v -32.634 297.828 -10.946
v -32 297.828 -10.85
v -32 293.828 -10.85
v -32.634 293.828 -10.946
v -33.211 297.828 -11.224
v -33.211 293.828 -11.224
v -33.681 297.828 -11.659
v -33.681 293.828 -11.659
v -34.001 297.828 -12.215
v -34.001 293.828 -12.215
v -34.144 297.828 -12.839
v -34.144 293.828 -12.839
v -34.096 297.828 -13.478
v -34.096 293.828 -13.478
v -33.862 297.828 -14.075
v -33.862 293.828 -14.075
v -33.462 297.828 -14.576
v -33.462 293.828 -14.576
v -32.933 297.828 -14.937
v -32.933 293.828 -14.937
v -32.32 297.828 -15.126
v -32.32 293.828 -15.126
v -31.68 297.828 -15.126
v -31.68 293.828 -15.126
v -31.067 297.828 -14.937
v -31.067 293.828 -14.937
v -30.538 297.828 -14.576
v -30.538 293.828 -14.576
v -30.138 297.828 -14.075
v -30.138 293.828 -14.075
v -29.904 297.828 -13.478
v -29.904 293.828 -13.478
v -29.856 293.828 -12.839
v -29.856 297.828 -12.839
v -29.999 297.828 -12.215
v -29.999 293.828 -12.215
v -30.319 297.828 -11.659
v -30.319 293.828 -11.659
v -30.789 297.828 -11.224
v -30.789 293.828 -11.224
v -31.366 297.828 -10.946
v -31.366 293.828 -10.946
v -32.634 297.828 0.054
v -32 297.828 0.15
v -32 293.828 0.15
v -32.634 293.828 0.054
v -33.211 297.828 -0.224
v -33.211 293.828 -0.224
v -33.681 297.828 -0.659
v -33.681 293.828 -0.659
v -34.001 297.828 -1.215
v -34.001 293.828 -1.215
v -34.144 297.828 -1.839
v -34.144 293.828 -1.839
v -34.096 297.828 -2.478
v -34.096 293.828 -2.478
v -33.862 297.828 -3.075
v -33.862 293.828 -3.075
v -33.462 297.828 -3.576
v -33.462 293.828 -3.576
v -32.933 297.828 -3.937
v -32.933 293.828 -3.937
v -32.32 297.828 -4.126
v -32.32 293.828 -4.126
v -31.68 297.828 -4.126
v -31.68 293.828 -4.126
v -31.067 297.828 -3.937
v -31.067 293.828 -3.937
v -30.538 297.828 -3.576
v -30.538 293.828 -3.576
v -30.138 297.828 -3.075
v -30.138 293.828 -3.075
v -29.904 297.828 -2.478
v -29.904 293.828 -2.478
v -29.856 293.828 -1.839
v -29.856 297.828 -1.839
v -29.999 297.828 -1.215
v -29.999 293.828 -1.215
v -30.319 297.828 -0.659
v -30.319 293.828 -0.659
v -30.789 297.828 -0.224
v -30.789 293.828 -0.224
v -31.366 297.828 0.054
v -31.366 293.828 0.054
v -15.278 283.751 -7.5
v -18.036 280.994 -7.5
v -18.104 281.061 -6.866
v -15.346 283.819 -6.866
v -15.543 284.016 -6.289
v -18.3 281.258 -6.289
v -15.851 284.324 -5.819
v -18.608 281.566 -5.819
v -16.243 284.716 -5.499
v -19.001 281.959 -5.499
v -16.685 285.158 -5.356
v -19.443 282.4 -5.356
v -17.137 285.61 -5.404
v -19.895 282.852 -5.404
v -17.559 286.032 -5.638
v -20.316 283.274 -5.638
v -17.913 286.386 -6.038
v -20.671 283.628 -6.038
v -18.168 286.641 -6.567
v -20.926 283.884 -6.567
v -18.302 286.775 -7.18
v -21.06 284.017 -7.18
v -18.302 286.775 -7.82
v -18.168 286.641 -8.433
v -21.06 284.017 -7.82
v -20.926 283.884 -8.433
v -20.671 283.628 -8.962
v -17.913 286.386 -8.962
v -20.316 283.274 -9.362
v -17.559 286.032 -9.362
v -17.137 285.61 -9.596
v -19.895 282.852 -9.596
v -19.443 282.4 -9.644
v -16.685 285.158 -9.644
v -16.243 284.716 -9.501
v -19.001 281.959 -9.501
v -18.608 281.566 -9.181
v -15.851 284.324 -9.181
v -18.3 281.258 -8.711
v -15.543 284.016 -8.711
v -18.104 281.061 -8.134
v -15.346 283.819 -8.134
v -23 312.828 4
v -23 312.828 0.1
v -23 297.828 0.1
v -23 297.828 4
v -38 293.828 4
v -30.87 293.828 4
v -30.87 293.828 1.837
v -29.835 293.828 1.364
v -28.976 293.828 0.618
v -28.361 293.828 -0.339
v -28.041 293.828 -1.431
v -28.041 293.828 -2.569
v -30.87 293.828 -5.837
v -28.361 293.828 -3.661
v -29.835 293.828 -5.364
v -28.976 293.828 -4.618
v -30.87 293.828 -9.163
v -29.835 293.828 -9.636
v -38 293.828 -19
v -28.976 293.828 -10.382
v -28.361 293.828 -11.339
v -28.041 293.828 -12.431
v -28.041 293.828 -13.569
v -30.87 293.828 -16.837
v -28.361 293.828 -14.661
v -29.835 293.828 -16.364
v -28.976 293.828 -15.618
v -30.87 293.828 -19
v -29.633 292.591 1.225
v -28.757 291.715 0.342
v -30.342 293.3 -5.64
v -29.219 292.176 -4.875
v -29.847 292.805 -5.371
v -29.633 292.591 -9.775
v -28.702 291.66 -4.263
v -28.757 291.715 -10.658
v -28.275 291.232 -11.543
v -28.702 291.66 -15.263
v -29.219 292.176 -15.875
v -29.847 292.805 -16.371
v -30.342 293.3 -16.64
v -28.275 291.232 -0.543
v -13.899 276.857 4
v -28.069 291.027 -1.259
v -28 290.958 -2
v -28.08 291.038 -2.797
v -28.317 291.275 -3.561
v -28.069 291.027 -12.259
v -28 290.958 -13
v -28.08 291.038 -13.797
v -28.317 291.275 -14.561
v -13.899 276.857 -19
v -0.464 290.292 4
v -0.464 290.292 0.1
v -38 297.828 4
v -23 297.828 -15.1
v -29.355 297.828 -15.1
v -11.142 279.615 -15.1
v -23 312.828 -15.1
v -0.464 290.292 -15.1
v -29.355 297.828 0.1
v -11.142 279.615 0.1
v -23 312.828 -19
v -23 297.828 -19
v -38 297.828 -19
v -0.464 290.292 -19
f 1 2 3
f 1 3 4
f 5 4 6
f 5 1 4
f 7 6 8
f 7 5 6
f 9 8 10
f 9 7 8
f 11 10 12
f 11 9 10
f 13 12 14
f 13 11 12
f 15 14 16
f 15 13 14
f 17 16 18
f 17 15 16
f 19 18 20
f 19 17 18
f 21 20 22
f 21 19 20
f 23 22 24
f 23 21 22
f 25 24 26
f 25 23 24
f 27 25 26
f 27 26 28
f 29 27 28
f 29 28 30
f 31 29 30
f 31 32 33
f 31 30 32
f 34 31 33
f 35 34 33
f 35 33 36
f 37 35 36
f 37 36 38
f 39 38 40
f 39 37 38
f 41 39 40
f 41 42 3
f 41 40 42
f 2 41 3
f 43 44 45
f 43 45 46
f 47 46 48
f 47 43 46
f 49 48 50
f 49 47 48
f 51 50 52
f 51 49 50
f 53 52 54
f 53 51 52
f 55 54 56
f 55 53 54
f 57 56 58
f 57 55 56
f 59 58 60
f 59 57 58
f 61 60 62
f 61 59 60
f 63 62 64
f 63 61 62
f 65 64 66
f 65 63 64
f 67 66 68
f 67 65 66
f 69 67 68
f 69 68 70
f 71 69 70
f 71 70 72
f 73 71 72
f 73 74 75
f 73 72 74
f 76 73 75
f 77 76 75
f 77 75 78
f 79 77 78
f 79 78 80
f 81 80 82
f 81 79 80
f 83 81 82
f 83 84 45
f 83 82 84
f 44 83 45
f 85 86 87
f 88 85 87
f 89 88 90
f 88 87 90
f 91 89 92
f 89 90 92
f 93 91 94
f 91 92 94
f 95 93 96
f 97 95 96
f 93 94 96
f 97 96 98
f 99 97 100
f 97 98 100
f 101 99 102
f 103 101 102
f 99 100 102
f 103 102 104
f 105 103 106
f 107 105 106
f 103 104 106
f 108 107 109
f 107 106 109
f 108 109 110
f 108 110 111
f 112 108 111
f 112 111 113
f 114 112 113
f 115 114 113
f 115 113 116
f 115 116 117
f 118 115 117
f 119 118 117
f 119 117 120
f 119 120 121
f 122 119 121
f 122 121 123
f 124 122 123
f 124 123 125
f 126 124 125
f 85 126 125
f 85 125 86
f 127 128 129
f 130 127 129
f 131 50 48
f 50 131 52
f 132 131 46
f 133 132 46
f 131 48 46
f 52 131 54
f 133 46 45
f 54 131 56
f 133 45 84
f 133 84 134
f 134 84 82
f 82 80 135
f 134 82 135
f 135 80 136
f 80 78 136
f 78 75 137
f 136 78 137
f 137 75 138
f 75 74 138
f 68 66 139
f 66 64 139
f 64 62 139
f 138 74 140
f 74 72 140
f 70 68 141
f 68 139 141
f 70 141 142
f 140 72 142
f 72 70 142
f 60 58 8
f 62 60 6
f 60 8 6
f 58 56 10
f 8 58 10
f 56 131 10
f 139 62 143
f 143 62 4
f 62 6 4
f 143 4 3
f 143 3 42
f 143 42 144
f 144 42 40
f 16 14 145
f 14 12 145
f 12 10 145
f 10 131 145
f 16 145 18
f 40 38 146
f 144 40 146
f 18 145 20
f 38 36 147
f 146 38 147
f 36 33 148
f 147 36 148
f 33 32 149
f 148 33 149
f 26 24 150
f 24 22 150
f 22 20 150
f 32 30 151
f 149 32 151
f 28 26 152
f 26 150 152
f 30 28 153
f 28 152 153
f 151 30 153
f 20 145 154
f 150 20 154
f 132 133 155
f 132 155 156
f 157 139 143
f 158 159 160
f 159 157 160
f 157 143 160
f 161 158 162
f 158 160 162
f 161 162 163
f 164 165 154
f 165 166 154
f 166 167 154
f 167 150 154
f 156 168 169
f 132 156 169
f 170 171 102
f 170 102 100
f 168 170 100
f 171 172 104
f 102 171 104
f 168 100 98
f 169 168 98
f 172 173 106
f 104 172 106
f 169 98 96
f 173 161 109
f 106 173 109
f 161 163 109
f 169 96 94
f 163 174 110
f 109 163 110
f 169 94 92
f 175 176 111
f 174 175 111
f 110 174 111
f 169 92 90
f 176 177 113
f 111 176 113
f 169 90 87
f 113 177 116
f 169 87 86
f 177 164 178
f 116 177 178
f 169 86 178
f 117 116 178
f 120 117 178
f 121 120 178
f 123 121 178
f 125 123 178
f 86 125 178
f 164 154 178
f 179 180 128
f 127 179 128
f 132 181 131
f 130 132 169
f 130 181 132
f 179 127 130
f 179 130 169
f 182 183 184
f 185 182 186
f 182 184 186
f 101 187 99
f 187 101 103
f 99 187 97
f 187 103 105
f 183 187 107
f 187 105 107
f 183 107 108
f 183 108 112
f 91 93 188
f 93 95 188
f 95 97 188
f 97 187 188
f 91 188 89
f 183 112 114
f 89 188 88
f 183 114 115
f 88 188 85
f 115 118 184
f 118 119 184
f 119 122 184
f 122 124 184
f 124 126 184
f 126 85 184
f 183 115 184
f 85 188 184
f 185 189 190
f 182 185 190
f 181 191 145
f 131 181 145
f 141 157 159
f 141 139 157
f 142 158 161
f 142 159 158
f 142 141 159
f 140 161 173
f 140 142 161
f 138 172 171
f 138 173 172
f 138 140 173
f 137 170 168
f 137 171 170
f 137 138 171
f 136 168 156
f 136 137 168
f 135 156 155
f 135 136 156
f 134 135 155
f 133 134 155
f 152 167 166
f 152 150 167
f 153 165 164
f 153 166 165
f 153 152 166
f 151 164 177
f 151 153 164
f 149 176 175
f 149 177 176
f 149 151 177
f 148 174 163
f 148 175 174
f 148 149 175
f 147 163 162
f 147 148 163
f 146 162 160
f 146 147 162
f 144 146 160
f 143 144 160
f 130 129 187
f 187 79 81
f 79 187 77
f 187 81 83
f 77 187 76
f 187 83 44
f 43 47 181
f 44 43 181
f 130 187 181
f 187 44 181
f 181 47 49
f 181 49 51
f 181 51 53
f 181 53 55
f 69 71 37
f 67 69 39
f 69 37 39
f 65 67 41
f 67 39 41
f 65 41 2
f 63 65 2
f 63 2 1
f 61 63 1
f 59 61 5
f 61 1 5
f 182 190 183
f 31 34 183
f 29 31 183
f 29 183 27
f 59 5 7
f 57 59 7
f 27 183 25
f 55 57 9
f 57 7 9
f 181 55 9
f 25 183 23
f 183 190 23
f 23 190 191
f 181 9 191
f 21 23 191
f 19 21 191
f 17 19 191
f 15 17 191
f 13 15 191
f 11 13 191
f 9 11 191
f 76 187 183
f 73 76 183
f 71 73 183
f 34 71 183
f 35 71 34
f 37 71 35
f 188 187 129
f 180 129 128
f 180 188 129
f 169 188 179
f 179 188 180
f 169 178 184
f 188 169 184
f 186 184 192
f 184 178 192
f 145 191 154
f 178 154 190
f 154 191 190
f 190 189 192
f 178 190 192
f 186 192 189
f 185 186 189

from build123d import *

# Parameters (mm, degrees)
EXTRUDE_1_DEPTH          = 4
EXTRUDE_1_DEPTH_BACK     = 19
SKETCH_2_W               = 15.2
SKETCH_2_H               = 15.221861726
CUT_EXTRUDE_1_DEPTH      = 67
CUT_EXTRUDE_2_DEPTH      = 67
CUT_EXTRUDE_2_DEPTH_BACK = 67
SKETCH_3_R               = 2.15
SKETCH_4_R               = 4
CUT_EXTRUDE_3_DEPTH      = 67
SKETCH_5_R               = 2.15
CUT_EXTRUDE_4_DEPTH      = 67


with BuildPart() as part:
    # 草图1 → 凸台-拉伸1 (new, two sides: drawn at the far end of the back side and taken through both)
    with BuildSketch(Plane.XY.offset(-EXTRUDE_1_DEPTH_BACK)):
        Polygon((-23, 312.827661494), (-23, 297.827661494), (-38, 297.827661494), (-38, 293.827661494), (-30.870057685, 293.827661494), (-13.899494937, 276.857098745), (-11.071067812, 279.68552587), (-0.464466094, 290.292127588), align=None)
    extrude(amount=EXTRUDE_1_DEPTH + EXTRUDE_1_DEPTH_BACK)

    # 草图2 → 切除-拉伸1 (cut)
    with BuildSketch(Plane(origin=(-145.378296841, 145.378296841, 0), x_dir=(0, 0, -1), z_dir=(0.7071067811865483, -0.7071067811865468, 0))):
        with Locations((7.5, 197.450035681)):
            Rectangle(SKETCH_2_W, SKETCH_2_H)
    extrude(amount=-CUT_EXTRUDE_1_DEPTH, mode=Mode.SUBTRACT)

    # 草图3 → 切除-拉伸2 (cut, two sides: drawn at the far end of the back side and taken through both)
    with BuildSketch(Plane.XZ.offset(-293.827661494).offset(-CUT_EXTRUDE_2_DEPTH_BACK)):
        with Locations((-32, -2)):
            Circle(SKETCH_3_R)
        with Locations((-32, -13)):
            Circle(SKETCH_3_R)
    extrude(amount=CUT_EXTRUDE_2_DEPTH + CUT_EXTRUDE_2_DEPTH_BACK, mode=Mode.SUBTRACT)

    # 草图4 → 切除-拉伸3 (cut)
    with BuildSketch(Plane.XZ.offset(-293.827661494)):
        with Locations((-32, -2)):
            Circle(SKETCH_4_R)
        with Locations((-32, -13)):
            Circle(SKETCH_4_R)
    extrude(amount=CUT_EXTRUDE_3_DEPTH, mode=Mode.SUBTRACT)

    # 草图5 → 切除-拉伸4 (cut)
    with BuildSketch(Plane(origin=(131.478801904, 131.478801904, 0), x_dir=(0, 0, 1), z_dir=(-0.7071067811865472, -0.7071067811865478, 0))):
        with Locations((-7.5, 213.595959067)):
            Circle(SKETCH_5_R)
    extrude(amount=-CUT_EXTRUDE_4_DEPTH, mode=Mode.SUBTRACT)


solid = part.part
